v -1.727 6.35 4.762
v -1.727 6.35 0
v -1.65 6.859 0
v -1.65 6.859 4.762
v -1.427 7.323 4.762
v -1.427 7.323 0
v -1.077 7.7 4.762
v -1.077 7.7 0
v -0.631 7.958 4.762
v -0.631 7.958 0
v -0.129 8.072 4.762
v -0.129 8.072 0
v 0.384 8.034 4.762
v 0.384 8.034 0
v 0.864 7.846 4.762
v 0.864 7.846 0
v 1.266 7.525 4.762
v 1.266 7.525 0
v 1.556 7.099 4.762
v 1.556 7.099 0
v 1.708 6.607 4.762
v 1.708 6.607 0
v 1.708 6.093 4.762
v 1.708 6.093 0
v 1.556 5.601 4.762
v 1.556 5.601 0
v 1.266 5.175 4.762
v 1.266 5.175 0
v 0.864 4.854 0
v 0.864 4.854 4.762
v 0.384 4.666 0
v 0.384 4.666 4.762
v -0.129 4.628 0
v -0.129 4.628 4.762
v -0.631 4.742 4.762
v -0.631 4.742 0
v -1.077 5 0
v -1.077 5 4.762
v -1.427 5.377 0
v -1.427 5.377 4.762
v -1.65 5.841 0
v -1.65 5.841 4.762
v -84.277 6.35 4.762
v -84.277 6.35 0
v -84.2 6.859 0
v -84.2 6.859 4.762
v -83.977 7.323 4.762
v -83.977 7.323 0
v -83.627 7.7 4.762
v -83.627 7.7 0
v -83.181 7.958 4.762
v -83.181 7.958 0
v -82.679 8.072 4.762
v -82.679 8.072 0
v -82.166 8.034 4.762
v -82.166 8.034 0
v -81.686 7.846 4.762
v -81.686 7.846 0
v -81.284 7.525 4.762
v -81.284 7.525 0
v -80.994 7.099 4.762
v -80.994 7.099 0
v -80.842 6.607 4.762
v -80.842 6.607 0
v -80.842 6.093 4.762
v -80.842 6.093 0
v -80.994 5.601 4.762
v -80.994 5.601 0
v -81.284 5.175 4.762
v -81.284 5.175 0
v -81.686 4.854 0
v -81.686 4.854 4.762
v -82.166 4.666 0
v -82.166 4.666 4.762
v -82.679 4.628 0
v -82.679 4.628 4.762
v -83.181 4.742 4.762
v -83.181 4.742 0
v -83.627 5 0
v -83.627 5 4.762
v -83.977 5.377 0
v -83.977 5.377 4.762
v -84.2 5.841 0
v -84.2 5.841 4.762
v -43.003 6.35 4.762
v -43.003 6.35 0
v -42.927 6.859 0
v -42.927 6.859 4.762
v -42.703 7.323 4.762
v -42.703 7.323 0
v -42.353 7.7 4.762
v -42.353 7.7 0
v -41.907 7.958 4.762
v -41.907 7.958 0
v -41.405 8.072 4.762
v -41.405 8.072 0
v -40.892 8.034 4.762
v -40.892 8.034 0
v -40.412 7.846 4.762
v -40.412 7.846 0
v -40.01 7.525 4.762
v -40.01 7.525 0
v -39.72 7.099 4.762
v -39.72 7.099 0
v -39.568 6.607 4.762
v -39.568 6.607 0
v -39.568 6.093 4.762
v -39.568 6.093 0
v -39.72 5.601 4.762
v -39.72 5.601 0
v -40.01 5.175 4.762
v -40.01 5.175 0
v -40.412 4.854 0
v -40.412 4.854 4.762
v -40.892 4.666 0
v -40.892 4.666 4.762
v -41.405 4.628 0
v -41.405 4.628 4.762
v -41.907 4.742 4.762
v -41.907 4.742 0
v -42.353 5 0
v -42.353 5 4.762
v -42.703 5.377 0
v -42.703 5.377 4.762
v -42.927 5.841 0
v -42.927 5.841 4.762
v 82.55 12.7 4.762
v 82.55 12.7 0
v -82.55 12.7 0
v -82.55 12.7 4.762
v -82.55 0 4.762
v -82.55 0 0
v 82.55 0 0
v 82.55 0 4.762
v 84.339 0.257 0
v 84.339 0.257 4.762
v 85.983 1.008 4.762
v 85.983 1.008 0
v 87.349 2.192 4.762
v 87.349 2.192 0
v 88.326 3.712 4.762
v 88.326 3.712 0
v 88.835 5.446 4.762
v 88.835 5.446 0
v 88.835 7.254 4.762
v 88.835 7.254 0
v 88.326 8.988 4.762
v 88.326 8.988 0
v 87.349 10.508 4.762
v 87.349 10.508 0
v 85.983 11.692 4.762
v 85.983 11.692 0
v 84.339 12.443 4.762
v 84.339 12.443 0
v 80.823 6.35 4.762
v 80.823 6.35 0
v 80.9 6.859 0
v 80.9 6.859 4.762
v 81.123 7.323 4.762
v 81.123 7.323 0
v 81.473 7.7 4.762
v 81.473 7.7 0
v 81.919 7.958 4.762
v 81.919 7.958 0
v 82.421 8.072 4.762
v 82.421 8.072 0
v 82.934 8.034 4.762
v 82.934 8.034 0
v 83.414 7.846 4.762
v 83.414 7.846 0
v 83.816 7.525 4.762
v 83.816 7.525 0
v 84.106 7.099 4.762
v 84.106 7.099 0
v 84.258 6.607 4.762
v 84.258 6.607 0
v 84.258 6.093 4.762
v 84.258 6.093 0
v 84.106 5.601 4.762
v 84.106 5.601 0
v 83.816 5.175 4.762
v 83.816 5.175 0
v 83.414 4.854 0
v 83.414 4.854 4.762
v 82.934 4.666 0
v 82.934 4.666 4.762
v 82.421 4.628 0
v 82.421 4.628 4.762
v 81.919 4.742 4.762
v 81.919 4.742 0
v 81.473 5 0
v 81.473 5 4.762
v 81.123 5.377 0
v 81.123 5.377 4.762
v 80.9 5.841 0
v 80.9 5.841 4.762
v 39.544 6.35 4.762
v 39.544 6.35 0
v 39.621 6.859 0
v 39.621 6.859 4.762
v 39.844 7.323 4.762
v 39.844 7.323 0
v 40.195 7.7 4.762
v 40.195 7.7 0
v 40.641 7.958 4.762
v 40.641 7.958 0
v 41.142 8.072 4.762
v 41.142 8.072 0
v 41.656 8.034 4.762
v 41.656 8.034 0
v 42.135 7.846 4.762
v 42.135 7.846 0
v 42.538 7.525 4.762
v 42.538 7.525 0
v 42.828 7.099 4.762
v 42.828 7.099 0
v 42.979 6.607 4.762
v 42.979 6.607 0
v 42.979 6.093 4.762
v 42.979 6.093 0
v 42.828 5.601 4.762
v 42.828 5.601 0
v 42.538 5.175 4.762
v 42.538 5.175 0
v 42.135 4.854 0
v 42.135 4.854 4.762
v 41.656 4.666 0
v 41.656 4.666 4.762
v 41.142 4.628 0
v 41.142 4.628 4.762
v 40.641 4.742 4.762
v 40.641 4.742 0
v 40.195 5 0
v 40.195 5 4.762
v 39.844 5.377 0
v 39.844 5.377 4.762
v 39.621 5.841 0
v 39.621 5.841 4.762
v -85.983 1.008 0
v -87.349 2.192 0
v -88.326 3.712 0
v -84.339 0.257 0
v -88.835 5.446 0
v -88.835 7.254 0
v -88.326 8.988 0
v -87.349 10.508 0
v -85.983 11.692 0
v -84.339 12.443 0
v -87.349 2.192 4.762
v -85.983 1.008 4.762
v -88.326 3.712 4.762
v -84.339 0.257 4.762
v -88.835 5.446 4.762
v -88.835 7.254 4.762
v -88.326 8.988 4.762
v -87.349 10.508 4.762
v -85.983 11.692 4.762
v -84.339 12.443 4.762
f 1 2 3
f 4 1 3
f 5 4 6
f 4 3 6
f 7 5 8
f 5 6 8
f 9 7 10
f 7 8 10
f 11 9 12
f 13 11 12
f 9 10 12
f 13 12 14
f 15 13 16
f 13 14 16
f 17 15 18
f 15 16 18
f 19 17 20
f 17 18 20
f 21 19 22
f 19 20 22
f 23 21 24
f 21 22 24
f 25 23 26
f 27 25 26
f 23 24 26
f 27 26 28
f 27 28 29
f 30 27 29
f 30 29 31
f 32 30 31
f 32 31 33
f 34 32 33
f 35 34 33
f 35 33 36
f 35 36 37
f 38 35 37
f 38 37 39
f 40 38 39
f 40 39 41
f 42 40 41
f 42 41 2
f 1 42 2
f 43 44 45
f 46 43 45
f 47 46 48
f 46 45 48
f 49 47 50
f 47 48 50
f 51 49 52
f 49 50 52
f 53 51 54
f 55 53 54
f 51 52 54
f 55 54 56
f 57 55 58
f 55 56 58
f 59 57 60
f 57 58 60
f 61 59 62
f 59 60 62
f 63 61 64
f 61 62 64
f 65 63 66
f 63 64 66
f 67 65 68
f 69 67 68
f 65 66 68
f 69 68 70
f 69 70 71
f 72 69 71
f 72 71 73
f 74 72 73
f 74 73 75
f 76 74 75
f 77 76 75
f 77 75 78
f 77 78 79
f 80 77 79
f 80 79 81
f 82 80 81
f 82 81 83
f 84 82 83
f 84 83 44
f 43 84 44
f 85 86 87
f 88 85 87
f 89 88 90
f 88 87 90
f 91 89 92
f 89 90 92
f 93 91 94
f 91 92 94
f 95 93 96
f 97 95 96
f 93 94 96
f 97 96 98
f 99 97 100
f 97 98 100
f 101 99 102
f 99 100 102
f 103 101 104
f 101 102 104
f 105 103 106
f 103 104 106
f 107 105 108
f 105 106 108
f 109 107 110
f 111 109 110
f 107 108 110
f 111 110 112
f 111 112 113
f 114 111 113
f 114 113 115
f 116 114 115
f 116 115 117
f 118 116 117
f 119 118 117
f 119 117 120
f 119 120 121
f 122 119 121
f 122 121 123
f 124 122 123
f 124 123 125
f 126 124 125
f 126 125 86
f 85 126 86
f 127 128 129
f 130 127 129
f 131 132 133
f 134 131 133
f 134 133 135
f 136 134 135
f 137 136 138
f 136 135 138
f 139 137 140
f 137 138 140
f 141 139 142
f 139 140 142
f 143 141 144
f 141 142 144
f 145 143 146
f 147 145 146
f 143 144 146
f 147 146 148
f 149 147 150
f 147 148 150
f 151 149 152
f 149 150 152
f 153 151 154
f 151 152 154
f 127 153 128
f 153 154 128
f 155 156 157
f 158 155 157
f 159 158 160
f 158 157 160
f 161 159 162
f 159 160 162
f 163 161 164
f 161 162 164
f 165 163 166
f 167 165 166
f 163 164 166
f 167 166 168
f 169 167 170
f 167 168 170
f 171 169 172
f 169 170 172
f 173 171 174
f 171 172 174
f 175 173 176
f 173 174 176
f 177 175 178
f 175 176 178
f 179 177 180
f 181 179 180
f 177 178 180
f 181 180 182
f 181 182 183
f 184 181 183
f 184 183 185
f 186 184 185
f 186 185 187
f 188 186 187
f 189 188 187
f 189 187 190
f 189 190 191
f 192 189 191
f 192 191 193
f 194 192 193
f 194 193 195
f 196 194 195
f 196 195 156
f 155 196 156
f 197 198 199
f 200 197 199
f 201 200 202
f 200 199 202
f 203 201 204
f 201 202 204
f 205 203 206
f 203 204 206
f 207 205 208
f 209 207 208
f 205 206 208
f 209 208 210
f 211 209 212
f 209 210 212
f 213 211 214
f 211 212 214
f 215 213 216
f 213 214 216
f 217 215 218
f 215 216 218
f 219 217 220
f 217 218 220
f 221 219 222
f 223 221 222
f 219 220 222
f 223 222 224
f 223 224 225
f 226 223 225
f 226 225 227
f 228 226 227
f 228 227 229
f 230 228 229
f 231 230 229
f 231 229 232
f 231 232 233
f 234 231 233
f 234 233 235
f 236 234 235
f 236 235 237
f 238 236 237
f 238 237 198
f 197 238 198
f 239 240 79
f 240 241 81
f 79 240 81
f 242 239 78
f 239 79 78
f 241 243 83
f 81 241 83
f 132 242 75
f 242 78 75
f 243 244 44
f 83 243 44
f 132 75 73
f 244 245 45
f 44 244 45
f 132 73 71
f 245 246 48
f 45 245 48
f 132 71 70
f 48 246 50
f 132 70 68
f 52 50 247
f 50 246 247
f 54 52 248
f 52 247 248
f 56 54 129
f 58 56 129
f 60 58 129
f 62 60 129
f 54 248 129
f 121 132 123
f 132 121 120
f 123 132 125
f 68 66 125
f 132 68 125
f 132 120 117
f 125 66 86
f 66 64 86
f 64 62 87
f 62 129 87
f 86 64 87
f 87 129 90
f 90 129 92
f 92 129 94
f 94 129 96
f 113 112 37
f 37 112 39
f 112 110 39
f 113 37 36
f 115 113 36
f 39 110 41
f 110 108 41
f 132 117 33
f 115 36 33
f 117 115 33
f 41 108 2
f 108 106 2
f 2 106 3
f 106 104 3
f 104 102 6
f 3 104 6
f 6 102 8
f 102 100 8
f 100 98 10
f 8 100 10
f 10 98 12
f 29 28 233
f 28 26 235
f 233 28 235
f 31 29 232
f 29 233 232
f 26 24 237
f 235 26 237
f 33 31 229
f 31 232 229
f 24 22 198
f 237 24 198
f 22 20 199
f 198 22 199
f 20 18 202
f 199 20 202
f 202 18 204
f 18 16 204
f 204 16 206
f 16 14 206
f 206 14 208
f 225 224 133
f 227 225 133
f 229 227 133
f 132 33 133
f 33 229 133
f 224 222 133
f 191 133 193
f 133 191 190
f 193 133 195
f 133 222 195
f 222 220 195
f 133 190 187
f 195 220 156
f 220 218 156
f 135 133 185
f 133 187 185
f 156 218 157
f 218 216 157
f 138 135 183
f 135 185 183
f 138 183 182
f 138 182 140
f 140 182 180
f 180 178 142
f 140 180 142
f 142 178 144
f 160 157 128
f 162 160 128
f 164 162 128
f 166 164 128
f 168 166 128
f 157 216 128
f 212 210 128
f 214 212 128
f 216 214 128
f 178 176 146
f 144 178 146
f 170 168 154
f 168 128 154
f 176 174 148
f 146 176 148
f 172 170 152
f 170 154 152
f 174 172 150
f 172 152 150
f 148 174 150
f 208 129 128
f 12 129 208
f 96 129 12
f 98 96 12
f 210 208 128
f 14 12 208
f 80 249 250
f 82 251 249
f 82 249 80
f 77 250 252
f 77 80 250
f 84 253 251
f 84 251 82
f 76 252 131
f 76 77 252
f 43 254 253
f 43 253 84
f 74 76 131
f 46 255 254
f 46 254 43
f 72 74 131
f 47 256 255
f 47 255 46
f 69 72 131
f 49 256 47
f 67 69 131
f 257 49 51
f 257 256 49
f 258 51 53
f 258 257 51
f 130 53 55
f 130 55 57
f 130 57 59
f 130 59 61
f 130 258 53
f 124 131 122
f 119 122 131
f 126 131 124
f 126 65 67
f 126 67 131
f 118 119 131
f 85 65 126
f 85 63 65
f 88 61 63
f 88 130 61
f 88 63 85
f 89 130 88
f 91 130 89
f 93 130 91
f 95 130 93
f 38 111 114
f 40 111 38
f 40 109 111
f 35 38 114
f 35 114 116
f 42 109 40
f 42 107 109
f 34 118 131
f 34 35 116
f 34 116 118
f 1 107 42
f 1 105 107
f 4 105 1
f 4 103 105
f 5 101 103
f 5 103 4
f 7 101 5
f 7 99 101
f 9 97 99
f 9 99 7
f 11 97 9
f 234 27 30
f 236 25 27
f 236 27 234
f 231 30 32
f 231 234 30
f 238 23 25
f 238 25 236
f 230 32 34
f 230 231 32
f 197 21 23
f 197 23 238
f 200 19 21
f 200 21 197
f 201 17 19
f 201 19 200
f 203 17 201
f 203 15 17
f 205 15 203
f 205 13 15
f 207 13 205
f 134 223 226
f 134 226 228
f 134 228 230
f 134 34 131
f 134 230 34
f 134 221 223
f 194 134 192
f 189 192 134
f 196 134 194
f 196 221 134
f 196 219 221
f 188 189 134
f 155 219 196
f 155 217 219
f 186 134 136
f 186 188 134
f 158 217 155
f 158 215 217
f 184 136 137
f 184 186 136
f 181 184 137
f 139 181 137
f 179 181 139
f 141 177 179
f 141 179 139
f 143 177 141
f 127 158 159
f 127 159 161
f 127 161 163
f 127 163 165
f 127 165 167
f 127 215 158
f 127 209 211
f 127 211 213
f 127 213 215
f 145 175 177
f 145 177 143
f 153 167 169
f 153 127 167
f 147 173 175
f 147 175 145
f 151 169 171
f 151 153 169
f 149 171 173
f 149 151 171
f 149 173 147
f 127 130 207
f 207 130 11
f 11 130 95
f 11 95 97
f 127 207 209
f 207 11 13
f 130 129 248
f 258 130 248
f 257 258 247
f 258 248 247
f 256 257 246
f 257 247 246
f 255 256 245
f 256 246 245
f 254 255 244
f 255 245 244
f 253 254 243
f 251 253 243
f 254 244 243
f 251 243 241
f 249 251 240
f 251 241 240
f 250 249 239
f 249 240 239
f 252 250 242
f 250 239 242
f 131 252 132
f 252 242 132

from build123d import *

# Parameters (mm, degrees)
BOSS_EXTRUDE1_DEPTH       = 4.7625
F_8_32_TAPPED_HOLE1_D     = 3.4544
F_8_32_TAPPED_HOLE1_DEPTH = 12.192
F_8_32_TAPPED_HOLE1_TIP   = 1.037806461


with BuildPart() as part:
    # Sketch1 → Boss-Extrude1 (new body)
    with BuildSketch(Plane.XY):
        with BuildLine():
            Line((-82.55, 0), (82.55, 0))
            ThreePointArc((82.55, 0), (88.9, 6.35), (82.55, 12.7))
            Line((82.55, 12.7), (-82.55, 12.7))
            ThreePointArc((-82.55, 12.7), (-88.9, 6.35), (-82.55, 0))
        make_face()
    extrude(amount=BOSS_EXTRUDE1_DEPTH)

    # #8-32 Tapped Hole1
    with Locations(Plane.XY.offset(4.7625)):
        with Locations((-82.55, 6.35), (82.55, 6.35), (0, 6.35), (41.27152138, 6.35), (-41.276070924, 6.35)):
            Hole(F_8_32_TAPPED_HOLE1_D / 2, depth=F_8_32_TAPPED_HOLE1_DEPTH)
            with Locations((0, 0, -(F_8_32_TAPPED_HOLE1_DEPTH + F_8_32_TAPPED_HOLE1_TIP / 2))):  # 118° drill point
                Cone(0, F_8_32_TAPPED_HOLE1_D / 2, F_8_32_TAPPED_HOLE1_TIP, mode=Mode.SUBTRACT)


solid = part.part
